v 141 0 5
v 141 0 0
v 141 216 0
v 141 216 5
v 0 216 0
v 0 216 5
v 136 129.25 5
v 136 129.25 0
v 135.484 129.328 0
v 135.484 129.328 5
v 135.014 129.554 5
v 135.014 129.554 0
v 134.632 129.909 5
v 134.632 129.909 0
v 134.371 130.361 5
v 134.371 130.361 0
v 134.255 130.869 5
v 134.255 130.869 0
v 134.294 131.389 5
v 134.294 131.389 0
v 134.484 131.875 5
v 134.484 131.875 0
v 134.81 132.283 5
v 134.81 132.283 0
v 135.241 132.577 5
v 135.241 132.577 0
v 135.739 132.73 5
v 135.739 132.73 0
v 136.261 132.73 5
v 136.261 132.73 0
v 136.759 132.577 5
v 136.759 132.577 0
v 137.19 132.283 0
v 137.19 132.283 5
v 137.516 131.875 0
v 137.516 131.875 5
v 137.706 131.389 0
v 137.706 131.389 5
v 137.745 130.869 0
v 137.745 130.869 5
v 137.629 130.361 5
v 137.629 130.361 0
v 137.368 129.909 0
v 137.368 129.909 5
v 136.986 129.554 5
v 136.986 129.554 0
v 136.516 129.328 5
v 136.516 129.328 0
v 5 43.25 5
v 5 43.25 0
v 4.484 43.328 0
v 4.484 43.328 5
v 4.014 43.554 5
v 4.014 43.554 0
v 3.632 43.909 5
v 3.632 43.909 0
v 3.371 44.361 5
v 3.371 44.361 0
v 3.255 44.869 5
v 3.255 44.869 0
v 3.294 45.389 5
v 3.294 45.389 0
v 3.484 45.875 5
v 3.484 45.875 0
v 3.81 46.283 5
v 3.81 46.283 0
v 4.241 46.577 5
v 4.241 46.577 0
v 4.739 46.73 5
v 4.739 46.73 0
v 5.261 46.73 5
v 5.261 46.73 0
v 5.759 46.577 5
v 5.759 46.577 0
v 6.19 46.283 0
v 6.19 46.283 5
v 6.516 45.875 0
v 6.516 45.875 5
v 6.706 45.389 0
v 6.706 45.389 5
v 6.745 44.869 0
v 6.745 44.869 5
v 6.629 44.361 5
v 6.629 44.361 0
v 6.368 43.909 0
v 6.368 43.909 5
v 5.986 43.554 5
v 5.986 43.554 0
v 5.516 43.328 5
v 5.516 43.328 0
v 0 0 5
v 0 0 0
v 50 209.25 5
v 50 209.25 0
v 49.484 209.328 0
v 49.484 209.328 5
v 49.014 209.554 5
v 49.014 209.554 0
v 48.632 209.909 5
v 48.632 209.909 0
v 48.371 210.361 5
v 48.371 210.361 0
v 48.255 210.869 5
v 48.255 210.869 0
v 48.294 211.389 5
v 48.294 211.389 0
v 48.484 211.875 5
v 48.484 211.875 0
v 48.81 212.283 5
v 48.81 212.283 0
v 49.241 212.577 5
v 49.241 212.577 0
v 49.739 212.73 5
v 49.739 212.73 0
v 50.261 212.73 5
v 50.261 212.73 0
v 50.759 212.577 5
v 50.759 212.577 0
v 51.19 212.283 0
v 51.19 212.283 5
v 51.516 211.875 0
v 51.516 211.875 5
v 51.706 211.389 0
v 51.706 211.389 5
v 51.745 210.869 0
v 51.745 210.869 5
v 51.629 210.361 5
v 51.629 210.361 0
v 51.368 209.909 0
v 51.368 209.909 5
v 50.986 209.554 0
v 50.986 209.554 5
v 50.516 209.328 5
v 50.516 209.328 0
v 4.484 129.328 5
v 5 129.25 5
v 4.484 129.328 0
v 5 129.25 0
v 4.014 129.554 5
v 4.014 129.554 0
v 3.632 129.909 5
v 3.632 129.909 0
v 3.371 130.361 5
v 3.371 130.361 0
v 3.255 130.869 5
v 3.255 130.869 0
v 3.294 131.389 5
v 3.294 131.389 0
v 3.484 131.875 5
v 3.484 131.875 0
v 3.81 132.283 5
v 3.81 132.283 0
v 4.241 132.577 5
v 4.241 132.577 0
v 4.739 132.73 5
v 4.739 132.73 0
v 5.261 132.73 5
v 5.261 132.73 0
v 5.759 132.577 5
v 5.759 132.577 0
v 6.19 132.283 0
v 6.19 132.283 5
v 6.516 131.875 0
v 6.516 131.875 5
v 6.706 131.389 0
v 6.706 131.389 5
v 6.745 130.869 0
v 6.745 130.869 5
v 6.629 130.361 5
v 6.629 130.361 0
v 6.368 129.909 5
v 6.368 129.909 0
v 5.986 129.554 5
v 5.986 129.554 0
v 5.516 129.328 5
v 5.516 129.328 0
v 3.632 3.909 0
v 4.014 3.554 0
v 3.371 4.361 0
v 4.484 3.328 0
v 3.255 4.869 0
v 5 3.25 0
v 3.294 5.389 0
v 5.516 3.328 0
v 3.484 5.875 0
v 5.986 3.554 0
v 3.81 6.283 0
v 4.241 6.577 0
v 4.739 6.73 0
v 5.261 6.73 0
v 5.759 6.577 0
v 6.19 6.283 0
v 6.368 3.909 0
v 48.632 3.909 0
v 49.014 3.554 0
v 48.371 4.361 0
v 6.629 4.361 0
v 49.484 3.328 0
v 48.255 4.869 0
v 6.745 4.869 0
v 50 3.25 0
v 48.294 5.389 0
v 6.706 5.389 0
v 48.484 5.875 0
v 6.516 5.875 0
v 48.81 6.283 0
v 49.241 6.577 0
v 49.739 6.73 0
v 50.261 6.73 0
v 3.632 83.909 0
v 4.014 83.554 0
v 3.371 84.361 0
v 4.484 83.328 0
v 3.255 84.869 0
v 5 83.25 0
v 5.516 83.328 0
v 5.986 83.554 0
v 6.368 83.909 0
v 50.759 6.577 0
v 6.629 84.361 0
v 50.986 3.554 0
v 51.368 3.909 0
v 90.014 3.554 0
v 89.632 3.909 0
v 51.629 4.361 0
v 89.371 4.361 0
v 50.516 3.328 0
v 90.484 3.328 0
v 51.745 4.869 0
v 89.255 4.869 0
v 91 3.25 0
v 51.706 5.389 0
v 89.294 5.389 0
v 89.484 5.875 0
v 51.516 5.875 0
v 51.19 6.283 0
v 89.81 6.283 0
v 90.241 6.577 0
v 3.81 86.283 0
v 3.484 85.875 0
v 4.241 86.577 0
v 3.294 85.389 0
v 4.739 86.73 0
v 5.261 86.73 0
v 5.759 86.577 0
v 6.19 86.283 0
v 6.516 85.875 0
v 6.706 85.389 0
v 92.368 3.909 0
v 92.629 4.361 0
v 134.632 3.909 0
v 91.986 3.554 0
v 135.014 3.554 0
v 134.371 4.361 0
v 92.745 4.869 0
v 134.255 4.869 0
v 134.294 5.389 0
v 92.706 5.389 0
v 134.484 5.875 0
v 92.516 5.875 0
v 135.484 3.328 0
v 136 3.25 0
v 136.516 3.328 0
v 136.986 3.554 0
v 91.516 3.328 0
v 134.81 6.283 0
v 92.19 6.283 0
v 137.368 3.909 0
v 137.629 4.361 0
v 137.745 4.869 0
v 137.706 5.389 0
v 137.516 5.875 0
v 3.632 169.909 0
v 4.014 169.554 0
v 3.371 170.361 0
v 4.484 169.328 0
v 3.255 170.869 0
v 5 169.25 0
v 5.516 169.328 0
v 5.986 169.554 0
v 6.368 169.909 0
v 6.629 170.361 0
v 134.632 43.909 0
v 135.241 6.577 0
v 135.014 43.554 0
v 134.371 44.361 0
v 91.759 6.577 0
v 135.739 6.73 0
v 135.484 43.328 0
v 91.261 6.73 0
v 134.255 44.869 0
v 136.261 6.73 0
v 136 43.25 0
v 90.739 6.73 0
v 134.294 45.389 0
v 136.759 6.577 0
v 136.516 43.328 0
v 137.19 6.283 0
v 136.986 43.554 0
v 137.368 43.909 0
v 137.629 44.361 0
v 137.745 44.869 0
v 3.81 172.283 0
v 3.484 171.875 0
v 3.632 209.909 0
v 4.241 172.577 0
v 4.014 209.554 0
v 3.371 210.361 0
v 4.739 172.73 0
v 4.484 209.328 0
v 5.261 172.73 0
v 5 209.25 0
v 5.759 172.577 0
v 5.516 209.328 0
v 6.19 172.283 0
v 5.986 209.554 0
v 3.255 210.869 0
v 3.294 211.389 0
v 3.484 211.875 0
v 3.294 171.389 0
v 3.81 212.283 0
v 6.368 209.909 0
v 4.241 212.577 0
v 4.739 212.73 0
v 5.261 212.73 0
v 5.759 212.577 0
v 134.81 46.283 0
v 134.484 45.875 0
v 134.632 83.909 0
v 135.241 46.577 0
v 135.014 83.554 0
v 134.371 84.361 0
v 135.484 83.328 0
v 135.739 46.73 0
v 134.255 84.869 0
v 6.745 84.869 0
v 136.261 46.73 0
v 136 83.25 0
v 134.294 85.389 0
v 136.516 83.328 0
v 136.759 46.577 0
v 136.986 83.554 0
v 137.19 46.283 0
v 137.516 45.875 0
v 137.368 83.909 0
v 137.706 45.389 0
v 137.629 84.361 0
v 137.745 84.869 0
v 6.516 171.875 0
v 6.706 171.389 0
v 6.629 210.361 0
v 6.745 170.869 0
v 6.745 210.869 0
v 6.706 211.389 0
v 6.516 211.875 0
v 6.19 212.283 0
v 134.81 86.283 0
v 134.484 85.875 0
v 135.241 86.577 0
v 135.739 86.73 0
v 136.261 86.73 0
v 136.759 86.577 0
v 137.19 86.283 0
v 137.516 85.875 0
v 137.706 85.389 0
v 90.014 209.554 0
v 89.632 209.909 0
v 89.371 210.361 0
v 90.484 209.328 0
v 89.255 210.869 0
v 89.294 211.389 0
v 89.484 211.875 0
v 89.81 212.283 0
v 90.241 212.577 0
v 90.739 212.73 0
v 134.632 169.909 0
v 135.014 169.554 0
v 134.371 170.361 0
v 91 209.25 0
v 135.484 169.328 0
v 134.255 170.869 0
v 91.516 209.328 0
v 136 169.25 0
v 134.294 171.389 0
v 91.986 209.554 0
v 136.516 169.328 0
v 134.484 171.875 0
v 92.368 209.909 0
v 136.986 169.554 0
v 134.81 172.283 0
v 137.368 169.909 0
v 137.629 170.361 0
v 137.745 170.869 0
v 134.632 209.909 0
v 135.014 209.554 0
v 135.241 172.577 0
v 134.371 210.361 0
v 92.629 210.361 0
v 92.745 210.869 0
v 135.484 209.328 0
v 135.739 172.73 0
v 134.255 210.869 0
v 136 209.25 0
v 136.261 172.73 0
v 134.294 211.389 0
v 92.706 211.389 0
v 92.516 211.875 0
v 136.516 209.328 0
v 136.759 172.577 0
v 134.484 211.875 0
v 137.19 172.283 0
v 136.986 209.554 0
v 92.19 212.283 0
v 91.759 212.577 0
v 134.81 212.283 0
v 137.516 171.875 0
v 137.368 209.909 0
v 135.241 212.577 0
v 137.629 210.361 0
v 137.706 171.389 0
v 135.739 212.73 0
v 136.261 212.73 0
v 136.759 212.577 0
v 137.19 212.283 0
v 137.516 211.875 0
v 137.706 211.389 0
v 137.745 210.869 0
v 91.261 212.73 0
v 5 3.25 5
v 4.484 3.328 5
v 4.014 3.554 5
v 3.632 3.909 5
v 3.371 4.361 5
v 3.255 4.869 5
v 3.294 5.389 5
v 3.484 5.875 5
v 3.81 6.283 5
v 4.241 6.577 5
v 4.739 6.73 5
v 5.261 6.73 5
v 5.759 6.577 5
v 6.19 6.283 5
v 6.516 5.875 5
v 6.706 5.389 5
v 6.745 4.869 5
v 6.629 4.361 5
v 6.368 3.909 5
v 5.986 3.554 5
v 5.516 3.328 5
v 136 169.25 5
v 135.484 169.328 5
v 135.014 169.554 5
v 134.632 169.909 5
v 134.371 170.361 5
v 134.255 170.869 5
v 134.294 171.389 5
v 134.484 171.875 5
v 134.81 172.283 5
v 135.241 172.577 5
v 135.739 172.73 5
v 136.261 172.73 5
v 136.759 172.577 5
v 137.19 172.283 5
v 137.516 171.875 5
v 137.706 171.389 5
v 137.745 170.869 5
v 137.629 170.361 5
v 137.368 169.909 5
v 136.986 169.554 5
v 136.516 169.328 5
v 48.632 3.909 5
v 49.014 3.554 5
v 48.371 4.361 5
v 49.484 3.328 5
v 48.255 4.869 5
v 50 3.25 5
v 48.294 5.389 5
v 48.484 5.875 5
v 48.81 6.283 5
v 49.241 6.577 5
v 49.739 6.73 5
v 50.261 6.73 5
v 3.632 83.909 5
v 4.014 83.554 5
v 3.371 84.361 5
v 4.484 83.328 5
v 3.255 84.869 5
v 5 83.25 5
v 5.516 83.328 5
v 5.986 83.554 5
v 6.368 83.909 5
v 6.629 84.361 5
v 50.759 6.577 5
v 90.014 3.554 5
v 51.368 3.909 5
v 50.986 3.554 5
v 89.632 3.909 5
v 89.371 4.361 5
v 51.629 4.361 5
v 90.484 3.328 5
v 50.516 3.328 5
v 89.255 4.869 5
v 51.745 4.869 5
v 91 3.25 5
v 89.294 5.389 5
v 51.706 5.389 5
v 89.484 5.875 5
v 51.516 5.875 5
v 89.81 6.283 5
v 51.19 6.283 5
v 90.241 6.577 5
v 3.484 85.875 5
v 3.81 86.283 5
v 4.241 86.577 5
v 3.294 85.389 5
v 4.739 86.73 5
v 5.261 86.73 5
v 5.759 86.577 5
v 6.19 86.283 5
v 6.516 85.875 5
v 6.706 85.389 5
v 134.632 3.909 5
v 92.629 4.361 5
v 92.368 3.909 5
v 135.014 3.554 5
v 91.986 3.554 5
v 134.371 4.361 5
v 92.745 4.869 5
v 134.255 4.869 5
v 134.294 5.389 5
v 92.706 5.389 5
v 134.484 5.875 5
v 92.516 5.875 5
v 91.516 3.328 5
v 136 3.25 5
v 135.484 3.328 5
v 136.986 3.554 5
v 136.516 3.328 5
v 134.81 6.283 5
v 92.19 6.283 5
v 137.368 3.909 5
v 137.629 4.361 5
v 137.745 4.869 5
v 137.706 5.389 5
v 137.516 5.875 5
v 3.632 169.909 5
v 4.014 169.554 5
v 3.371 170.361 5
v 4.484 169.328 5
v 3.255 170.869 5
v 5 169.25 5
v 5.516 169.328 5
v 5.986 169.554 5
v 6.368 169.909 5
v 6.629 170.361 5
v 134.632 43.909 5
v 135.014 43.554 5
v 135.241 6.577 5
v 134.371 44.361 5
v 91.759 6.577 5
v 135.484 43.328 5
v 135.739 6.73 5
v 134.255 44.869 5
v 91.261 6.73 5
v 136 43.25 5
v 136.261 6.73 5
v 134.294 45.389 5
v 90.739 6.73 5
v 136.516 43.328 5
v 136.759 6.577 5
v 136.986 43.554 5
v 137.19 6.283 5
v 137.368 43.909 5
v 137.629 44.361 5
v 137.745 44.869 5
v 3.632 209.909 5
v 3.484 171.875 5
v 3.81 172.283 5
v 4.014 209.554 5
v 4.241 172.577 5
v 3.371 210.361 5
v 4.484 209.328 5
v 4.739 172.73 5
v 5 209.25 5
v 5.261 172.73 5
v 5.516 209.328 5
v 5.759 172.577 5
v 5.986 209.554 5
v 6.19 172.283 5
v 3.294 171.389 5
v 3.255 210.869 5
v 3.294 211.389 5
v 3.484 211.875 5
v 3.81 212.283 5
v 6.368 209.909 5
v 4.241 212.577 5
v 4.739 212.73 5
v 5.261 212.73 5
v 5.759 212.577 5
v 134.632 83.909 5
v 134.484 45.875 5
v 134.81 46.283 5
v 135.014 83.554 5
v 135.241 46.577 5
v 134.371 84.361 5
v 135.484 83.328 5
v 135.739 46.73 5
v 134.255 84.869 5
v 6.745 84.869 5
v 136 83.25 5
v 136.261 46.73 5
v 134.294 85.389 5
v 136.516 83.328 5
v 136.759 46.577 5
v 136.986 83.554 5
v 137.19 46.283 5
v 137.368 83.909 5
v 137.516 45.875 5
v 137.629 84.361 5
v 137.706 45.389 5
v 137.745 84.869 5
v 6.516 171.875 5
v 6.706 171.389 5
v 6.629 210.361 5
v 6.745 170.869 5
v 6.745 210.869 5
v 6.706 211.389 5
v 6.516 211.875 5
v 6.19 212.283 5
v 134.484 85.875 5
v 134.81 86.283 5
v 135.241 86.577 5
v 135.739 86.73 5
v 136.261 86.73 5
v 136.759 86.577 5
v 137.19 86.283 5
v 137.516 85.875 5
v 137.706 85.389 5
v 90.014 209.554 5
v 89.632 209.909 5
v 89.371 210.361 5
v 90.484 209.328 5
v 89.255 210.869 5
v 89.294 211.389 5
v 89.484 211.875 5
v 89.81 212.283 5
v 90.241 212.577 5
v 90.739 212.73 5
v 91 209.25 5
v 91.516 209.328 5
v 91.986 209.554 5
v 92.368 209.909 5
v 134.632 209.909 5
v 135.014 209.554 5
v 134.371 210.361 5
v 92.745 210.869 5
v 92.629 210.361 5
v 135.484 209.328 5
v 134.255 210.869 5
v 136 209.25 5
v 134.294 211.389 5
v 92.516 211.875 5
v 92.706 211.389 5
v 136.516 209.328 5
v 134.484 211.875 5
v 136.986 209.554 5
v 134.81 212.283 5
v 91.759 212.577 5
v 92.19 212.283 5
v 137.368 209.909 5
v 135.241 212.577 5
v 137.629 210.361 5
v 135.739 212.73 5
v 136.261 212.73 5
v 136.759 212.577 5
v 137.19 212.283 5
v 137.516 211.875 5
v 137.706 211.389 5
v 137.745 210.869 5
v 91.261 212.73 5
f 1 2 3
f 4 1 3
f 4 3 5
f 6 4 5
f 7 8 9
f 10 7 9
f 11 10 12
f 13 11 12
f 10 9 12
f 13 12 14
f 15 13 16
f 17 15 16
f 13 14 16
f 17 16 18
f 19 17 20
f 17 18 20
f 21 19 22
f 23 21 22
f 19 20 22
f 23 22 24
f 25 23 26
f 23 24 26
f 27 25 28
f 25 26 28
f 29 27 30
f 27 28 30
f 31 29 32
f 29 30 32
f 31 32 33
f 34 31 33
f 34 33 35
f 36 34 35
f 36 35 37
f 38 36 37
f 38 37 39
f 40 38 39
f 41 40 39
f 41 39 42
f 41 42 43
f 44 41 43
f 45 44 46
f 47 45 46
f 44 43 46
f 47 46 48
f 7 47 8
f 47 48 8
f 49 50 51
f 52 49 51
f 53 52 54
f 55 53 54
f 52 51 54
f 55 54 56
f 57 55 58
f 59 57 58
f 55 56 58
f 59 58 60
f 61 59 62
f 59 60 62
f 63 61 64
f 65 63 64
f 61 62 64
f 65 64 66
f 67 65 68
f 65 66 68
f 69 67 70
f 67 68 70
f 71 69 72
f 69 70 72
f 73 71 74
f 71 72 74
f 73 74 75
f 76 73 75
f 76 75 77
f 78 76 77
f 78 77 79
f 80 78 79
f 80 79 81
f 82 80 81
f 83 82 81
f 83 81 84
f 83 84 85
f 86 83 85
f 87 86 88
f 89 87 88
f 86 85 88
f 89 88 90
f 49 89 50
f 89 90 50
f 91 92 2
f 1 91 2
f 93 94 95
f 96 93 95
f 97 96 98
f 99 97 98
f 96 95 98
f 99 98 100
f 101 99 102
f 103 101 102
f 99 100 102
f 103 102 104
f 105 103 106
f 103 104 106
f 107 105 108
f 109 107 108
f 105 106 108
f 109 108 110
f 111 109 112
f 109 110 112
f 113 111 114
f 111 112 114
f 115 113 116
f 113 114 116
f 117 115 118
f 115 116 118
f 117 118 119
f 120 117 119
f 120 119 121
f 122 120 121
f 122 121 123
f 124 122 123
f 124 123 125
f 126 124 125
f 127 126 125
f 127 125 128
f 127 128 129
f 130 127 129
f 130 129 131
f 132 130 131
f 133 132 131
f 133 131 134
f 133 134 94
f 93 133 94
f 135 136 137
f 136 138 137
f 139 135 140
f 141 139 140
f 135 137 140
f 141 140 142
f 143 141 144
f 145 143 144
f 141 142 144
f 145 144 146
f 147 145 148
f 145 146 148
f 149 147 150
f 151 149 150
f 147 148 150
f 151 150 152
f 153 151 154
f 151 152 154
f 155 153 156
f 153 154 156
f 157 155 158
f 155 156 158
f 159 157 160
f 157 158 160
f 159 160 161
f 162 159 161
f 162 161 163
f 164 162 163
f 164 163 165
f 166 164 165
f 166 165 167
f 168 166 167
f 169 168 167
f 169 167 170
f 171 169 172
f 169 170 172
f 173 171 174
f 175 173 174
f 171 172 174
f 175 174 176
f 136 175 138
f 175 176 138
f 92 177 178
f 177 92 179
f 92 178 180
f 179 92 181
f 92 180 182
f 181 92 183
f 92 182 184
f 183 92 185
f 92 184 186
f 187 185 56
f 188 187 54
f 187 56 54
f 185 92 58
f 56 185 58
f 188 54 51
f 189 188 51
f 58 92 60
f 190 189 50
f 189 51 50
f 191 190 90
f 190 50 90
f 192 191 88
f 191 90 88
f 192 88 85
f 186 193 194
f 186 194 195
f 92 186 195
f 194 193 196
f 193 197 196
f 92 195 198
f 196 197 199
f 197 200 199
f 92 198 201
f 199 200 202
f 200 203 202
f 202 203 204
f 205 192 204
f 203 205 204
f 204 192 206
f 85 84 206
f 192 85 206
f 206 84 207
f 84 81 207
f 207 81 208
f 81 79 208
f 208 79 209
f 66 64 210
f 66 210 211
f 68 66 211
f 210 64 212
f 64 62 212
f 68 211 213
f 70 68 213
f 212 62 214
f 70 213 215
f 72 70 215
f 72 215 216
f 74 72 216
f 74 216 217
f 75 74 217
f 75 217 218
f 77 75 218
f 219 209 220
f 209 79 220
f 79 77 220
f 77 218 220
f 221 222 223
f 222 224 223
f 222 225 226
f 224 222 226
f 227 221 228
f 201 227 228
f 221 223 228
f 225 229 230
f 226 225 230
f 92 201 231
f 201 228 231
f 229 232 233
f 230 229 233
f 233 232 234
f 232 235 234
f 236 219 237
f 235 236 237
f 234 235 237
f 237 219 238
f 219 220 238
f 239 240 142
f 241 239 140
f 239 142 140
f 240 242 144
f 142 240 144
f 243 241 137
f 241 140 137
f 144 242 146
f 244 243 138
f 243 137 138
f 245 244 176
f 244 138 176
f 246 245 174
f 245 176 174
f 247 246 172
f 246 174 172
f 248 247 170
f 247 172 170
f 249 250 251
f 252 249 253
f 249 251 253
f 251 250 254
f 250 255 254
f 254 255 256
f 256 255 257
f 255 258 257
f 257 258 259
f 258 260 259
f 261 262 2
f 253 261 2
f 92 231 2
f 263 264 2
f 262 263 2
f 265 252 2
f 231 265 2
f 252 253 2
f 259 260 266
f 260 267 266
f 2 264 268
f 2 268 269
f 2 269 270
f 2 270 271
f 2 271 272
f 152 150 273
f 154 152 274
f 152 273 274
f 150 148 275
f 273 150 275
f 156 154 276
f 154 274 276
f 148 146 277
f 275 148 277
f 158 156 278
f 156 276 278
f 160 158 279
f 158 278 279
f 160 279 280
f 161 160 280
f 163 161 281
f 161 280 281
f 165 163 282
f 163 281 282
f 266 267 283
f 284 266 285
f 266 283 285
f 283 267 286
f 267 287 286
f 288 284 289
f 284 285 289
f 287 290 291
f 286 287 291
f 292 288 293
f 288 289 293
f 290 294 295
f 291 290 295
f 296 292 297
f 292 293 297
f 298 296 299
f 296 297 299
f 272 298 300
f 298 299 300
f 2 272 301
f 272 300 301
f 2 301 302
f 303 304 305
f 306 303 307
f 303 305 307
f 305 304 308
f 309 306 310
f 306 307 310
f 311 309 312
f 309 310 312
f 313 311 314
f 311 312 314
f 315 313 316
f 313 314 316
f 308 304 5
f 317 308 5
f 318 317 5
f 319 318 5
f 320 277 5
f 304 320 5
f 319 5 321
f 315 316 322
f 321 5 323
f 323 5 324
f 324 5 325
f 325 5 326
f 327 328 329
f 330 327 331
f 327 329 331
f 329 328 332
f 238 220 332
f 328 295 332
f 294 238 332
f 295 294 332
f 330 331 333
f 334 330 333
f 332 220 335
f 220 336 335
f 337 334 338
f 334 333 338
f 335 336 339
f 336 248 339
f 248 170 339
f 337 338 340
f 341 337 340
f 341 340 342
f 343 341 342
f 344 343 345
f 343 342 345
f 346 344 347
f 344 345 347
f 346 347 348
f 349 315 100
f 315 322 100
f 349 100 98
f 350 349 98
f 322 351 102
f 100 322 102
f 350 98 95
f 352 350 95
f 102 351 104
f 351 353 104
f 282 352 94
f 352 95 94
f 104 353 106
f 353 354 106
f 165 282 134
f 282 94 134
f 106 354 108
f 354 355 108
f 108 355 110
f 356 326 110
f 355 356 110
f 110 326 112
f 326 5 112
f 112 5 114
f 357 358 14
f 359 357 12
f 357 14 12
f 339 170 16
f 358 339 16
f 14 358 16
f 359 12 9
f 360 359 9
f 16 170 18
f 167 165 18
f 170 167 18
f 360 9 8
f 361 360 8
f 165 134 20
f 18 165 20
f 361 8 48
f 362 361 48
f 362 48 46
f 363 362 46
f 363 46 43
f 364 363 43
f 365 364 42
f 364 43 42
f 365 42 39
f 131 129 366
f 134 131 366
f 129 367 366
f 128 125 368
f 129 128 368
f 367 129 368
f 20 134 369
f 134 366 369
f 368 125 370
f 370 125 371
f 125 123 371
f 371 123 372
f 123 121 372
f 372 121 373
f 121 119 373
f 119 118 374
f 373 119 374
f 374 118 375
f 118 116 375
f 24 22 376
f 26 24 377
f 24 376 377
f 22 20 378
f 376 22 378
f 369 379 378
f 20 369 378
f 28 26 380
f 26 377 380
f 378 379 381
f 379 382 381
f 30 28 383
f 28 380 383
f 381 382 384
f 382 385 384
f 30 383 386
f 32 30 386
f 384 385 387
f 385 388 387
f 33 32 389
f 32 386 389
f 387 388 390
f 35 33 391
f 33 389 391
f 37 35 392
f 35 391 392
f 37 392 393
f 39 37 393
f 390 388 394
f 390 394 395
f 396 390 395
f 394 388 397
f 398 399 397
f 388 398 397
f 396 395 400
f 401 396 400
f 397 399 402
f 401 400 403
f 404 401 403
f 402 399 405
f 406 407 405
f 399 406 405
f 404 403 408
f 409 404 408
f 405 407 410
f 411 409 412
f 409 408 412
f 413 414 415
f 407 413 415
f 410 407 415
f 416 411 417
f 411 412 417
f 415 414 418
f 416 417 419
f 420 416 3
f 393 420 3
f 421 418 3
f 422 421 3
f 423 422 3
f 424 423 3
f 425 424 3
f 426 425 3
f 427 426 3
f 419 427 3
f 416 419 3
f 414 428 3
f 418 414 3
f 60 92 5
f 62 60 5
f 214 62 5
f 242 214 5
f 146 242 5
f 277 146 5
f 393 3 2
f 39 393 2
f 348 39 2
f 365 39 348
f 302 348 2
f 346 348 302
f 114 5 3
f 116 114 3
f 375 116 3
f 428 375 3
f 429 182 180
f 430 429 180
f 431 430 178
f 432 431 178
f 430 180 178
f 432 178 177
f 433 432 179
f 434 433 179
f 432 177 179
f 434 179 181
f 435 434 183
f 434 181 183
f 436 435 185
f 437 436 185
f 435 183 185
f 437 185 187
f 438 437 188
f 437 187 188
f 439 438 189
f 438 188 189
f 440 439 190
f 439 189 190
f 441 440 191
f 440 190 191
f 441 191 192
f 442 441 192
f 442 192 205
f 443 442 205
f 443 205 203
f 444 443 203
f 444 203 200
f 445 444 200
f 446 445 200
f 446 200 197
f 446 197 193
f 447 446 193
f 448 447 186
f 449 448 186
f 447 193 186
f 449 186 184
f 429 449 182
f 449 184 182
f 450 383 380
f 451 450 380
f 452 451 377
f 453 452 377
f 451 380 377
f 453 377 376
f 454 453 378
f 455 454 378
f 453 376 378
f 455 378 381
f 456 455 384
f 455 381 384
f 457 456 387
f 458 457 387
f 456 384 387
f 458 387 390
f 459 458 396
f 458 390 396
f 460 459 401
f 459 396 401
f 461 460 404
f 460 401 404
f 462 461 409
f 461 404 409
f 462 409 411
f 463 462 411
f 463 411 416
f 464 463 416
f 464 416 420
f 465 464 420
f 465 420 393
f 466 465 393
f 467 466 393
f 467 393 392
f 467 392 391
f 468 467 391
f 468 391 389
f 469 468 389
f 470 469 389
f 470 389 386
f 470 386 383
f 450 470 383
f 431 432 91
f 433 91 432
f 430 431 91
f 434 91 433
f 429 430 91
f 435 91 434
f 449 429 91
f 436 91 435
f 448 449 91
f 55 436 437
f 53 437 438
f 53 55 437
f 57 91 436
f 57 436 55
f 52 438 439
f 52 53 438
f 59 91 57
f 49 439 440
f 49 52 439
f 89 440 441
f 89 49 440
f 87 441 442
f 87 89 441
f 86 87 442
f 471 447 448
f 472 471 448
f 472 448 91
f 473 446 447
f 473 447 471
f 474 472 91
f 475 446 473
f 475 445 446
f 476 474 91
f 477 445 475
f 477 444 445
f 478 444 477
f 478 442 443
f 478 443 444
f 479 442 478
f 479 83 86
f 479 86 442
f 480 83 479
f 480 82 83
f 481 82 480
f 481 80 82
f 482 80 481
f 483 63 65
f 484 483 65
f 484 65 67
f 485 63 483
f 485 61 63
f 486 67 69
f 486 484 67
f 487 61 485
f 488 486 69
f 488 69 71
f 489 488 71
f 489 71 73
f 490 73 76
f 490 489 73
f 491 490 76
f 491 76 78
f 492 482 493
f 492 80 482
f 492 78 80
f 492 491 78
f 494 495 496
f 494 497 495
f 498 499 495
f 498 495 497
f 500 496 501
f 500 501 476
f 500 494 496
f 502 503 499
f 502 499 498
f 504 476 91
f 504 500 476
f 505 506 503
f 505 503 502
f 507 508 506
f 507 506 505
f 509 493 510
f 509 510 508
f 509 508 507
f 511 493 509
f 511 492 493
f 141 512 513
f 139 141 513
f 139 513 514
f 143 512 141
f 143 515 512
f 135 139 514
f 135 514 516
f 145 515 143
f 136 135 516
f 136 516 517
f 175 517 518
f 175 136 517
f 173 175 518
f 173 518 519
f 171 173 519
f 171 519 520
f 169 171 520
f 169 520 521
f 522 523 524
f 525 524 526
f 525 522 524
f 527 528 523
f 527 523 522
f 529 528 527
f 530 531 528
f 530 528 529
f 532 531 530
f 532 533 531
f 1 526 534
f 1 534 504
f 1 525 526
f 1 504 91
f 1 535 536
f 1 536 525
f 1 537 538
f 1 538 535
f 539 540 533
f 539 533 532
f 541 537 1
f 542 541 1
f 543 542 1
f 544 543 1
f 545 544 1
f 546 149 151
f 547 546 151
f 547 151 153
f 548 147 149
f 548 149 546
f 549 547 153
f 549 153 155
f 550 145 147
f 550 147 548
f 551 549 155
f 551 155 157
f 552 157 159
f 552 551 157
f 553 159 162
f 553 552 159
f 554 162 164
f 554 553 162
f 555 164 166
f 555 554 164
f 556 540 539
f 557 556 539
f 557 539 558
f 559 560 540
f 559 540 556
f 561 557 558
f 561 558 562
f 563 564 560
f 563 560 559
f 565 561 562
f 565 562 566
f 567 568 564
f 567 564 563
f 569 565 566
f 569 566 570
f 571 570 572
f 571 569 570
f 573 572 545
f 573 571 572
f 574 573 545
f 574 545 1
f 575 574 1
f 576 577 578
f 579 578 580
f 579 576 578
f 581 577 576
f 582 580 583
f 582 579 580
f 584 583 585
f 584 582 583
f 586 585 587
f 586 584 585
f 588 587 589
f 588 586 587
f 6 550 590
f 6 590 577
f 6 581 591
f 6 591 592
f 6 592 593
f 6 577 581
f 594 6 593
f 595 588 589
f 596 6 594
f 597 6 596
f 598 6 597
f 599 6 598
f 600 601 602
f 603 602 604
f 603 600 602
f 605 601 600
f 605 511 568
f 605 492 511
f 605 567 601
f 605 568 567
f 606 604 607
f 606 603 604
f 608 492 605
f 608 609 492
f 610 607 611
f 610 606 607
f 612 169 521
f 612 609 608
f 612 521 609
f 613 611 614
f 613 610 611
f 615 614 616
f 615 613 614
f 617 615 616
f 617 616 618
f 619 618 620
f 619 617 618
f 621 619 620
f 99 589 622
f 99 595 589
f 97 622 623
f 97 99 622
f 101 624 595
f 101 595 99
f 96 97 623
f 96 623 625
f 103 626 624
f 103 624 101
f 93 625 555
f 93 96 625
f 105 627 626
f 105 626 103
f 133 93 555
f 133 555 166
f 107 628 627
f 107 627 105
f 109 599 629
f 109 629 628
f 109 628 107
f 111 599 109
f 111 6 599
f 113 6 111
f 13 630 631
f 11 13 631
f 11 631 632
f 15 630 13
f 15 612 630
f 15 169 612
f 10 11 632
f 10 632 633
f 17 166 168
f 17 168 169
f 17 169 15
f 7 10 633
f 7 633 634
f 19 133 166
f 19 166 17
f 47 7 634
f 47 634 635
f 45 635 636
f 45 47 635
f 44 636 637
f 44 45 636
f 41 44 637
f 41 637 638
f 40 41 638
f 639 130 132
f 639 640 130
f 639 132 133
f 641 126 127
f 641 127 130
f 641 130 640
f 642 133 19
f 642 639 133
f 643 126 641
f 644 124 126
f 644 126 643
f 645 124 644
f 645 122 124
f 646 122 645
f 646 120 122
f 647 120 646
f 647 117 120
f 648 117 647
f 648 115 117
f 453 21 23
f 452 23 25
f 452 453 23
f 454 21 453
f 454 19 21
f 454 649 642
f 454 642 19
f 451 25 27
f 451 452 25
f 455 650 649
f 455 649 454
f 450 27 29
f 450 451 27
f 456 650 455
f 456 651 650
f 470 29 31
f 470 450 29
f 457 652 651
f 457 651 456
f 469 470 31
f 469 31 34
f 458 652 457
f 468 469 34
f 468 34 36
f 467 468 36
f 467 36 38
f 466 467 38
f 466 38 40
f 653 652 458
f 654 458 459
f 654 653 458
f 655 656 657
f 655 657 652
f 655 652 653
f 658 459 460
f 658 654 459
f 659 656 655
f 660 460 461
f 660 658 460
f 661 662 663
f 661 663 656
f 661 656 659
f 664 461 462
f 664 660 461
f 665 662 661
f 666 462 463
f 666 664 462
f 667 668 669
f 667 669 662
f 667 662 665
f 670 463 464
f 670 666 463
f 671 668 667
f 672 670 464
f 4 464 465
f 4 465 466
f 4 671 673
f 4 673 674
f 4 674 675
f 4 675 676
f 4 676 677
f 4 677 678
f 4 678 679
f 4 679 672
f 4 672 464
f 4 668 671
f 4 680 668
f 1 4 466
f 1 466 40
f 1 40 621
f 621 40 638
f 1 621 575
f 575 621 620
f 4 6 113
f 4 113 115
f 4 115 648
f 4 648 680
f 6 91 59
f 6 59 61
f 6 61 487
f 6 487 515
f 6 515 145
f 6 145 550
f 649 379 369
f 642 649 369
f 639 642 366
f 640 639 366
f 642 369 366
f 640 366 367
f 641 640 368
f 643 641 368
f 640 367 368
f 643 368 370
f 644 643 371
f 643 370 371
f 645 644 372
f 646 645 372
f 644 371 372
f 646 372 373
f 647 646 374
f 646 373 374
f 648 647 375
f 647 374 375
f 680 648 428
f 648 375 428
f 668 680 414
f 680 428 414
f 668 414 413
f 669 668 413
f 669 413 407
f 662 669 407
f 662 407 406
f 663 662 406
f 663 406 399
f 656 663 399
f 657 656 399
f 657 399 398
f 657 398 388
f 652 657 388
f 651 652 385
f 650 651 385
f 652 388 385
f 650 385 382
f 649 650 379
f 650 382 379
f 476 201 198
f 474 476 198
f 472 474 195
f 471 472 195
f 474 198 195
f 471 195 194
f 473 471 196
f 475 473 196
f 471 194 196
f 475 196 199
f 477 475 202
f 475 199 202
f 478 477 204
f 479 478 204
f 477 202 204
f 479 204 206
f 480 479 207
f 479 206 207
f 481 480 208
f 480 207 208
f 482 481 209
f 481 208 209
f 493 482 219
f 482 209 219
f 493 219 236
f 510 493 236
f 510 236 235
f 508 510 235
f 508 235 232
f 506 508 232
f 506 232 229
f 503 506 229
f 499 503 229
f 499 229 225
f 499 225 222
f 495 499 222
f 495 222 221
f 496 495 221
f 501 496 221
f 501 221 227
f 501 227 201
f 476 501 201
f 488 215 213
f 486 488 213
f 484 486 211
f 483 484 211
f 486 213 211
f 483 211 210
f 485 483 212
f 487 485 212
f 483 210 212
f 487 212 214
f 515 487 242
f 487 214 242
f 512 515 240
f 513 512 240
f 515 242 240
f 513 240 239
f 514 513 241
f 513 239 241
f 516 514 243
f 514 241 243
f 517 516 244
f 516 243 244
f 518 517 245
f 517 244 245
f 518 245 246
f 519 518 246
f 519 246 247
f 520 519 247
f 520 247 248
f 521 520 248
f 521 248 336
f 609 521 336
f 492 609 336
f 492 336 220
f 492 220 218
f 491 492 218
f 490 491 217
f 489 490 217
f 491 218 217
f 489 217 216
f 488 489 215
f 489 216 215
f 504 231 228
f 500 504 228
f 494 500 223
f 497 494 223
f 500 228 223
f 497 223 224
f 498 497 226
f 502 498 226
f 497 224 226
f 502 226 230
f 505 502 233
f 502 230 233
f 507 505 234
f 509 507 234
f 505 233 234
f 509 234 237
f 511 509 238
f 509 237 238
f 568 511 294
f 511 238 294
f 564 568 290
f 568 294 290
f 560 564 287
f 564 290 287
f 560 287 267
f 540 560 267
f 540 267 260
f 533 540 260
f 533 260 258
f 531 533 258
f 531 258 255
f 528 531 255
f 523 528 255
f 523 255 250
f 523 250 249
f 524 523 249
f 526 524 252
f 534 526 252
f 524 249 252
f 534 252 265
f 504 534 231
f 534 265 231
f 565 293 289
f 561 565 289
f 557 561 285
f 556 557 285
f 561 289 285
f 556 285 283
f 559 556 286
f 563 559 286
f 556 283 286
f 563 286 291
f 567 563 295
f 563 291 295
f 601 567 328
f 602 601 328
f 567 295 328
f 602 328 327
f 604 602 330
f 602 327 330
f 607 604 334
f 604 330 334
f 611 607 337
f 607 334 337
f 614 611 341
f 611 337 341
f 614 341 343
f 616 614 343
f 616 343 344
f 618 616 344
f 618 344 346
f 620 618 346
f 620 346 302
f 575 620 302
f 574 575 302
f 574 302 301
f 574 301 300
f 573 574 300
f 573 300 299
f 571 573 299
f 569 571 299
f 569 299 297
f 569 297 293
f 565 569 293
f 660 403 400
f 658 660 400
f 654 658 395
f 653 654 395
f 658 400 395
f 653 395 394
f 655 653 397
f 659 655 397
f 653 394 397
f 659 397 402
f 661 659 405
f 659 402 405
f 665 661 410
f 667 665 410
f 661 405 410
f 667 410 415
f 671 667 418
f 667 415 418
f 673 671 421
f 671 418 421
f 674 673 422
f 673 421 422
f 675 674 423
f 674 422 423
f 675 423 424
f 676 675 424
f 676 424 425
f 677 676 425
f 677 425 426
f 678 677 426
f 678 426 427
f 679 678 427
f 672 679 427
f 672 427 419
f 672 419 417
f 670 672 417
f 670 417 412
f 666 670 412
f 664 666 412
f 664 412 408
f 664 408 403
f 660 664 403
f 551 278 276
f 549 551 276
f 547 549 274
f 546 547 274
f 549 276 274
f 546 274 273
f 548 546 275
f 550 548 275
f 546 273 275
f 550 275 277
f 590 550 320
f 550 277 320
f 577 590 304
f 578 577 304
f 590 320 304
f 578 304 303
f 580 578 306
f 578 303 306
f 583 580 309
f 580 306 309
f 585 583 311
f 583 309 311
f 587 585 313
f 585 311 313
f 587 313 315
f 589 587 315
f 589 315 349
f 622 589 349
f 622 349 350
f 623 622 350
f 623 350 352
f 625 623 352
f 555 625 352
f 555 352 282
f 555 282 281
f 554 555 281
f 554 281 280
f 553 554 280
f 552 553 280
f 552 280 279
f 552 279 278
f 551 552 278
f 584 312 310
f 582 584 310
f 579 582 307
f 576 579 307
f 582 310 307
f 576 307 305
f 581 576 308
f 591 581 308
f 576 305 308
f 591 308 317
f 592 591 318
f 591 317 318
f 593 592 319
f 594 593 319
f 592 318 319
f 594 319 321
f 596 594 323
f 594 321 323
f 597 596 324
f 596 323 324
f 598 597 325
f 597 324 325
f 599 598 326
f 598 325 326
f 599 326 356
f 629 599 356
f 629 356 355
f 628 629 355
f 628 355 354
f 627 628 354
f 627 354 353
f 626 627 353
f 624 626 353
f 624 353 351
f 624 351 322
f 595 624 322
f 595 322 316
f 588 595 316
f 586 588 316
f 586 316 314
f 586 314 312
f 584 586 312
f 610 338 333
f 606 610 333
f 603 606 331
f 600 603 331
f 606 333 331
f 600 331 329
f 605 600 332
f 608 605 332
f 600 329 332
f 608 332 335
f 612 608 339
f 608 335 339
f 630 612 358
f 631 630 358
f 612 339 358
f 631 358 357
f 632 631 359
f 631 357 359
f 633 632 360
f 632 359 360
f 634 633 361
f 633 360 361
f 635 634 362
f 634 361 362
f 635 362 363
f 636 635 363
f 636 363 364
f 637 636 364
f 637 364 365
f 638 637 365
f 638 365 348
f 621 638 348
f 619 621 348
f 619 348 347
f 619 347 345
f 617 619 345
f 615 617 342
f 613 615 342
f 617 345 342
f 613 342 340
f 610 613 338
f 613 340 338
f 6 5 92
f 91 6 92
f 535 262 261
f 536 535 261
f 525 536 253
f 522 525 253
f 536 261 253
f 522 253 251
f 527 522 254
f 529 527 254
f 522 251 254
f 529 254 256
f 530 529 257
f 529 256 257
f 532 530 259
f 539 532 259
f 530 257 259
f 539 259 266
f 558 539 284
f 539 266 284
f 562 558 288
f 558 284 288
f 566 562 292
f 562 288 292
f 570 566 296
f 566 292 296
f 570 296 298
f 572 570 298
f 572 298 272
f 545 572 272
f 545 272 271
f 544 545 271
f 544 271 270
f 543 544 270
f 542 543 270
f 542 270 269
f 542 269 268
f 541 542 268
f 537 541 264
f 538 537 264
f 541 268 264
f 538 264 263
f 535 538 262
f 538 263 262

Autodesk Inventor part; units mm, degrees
ref_plane "YZ Plane" through (0, 0, 0) normal (1, 0, 0) x (0, 1, 0)
ref_plane "XZ Plane" through (0, 0, 0) normal (0, 1, 0) x (-1, 0, 0)
ref_plane "XY Plane" through (0, 0, 0) normal (0, 0, 1) x (1, 0, 0)
sketch "Sketch1" plane through (0, 0, 0) normal (0, 0, 1) x (1, 0, 0)
  line L0 (0, 0) -> (141, 0)
  line L1 (141, 0) -> (141, 216)
  line L2 (141, 216) -> (0, 216)
  line L3 (0, 216) -> (0, 0)
  dimension "d0" = 141
  dimension "d1" = 216
extrude "Extrusion1" add sketch "Sketch1" along normal blind 5
sketch "Sketch2" plane through (0, 0, 5) normal (0, 0, 1) x (1, 0, 0)
  line L0 (141, 216) -> (0, 216) projected
  line L1 (0, 216) -> (0, 0) projected
  line L2 (141, 0) -> (141, 216) projected
  line L3 (0, 0) -> (141, 0) projected
  point P0 (5, 211)
  point P1 (136, 211)
  point P2 (136, 5)
  point P3 (5, 5)
  point P4 (5, 171)
  point P5 (136, 171)
  point P6 (5, 131)
  point P7 (136, 131)
  point P8 (50, 211)
  point P9 (50, 5)
  point P10 (91, 211)
  point P11 (91, 5)
  point P12 (5, 45)
  point P13 (136, 45)
  point P14 (5, 85)
  point P15 (136, 85)
  dimension "d11" = 5
  dimension "d12" = 5
  dimension "d13" = 5
  dimension "d14" = 5
  dimension "d15" = 5
  dimension "d16" = 5
  dimension "d17" = 5
  dimension "d18" = 5
  dimension "d35" = 40
  dimension "d42" = 45
  dimension "d49" = 45
  dimension "d56" = 40
hole "Hole1" at (5, 211, 5) at (136, 211, 5) at (136, 5, 5) at (5, 5, 5) at (5, 171, 5) at (136, 171, 5) at (5, 131, 5) at (136, 131, 5) at (50, 211, 5) at (50, 5, 5) at (91, 211, 5) at (91, 5, 5) at (5, 45, 5) at (136, 45, 5) at (5, 85, 5) at (136, 85, 5) direction (0, 0, -1) diameter 3.5 end through all
properties part number "acrylic_for_PSI" material "Aluminum 6061"
